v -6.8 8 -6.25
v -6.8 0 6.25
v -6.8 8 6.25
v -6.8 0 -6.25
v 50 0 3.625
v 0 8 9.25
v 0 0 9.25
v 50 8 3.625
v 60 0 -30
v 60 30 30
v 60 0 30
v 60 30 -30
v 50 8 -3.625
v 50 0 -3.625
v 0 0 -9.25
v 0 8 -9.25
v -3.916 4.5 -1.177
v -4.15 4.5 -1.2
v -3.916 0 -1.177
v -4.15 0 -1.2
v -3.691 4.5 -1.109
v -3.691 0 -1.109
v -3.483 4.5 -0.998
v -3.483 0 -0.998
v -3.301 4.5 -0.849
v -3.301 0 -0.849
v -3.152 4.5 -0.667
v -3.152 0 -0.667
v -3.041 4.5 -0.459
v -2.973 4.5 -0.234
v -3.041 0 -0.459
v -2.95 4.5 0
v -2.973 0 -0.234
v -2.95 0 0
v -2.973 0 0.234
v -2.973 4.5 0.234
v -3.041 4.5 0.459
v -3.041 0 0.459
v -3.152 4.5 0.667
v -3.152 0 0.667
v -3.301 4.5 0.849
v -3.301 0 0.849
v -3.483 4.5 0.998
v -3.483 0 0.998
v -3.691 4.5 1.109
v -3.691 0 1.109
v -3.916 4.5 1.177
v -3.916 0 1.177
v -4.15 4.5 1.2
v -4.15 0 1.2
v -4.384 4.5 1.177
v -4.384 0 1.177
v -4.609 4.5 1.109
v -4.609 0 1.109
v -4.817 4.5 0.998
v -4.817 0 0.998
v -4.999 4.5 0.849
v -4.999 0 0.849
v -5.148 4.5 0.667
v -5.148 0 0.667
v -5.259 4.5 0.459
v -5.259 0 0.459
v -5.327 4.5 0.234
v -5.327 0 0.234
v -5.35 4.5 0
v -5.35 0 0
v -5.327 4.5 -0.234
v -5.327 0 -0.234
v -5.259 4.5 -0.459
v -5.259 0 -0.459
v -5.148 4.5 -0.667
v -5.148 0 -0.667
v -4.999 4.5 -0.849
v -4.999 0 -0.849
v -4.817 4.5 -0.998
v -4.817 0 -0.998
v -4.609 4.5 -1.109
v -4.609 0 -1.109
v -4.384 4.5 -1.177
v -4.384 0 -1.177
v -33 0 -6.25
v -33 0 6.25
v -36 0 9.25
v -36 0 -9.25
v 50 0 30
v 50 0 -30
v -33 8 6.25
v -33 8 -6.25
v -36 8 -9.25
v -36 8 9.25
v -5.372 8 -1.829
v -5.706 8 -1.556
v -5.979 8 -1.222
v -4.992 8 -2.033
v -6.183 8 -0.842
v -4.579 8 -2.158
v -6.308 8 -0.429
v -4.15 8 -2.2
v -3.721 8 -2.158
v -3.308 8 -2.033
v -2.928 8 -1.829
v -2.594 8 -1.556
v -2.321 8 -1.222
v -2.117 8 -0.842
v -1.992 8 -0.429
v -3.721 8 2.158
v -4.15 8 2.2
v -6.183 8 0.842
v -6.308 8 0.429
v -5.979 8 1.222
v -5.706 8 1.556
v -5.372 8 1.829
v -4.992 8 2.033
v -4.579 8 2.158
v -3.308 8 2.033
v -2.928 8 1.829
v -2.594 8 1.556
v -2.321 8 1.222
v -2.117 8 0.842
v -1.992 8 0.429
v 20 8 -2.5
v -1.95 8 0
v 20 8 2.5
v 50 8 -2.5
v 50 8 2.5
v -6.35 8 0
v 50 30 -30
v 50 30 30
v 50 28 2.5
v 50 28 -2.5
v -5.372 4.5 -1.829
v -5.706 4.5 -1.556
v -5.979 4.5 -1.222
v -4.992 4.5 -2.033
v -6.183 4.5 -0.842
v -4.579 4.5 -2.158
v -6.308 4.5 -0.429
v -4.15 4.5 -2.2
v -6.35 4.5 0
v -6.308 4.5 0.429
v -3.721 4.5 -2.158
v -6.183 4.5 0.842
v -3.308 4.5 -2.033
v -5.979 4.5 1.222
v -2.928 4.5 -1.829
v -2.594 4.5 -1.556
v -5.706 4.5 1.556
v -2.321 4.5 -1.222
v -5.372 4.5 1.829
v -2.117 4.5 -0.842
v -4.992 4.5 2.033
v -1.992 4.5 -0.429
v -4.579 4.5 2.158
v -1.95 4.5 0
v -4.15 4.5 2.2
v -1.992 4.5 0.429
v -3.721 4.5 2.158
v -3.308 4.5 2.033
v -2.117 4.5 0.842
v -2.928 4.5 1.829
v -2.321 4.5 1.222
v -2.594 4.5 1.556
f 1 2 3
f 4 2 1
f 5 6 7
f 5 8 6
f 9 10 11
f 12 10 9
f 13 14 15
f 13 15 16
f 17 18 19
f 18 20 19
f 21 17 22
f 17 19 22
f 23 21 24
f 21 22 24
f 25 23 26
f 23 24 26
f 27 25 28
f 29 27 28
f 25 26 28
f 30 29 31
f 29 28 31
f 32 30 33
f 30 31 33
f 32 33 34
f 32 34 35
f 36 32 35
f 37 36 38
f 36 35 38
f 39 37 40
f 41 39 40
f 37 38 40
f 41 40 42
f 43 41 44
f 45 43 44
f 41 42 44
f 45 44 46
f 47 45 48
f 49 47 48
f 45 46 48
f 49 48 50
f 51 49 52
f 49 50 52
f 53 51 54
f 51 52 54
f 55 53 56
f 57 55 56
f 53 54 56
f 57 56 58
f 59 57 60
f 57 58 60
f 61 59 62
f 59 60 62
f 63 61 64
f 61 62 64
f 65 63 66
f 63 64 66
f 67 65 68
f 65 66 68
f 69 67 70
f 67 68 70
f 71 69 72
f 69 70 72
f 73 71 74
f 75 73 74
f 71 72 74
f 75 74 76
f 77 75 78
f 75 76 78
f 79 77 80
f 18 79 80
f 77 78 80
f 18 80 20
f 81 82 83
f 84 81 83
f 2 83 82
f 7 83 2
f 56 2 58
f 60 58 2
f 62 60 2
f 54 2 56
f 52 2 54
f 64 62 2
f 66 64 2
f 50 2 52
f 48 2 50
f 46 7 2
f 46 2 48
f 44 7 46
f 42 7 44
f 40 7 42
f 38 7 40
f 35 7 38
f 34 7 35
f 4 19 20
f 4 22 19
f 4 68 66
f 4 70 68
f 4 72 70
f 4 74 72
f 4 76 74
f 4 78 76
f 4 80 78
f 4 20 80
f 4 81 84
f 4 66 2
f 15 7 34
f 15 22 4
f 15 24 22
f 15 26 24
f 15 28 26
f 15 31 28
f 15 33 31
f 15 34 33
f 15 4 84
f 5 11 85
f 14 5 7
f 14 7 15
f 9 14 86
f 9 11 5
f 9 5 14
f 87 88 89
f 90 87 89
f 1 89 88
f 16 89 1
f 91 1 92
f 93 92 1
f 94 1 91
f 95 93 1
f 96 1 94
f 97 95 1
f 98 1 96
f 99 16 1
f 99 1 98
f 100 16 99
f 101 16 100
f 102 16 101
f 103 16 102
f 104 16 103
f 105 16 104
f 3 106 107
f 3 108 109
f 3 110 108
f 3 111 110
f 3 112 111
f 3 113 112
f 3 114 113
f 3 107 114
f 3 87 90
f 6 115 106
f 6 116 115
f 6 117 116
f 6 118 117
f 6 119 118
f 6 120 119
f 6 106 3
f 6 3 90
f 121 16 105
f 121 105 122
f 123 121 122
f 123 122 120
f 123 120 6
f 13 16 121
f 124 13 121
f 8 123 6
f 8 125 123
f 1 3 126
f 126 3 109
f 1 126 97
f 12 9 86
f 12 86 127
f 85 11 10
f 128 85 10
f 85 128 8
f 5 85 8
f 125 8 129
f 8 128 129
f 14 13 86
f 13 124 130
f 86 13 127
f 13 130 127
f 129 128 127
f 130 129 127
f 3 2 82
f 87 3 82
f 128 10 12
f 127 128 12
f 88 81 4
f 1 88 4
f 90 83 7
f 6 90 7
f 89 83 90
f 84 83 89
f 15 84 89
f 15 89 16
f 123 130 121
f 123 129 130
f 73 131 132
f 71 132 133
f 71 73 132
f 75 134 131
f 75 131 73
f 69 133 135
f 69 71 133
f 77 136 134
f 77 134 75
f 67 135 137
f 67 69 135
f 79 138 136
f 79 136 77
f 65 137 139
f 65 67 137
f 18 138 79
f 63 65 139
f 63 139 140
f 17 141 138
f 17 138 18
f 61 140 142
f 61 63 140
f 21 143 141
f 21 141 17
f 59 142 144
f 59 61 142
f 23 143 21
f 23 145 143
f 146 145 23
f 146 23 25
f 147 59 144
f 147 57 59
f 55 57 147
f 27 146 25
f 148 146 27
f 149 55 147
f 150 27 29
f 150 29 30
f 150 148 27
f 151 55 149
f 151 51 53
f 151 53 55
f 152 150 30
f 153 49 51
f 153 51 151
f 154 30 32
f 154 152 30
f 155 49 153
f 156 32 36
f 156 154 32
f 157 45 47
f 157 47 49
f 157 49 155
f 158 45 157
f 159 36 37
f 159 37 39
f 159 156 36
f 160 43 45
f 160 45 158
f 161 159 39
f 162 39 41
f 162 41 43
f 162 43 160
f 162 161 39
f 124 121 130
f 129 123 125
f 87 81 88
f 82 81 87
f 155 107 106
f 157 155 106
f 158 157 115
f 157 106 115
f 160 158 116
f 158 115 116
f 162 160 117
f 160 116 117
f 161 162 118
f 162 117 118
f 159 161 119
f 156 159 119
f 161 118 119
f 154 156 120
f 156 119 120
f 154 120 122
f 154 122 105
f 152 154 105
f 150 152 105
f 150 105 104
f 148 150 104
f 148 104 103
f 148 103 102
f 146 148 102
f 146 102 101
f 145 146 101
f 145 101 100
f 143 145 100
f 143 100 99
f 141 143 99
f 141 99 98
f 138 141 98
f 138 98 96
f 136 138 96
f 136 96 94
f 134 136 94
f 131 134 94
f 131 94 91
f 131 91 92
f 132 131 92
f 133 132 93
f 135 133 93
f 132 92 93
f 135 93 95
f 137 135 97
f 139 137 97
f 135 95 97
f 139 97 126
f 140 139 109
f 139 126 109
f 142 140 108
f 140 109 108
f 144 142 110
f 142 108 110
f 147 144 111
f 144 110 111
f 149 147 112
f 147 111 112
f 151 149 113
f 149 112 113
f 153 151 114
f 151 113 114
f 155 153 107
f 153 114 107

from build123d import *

# Parameters (mm, degrees)
SKETCH_1_W                   = 36
SKETCH_1_H                   = 18.5
EXTRUDE_1_DEPTH              = 8
HOLE_WIZARD_M2_1_D           = 2.4
HOLE_WIZARD_M2_1_CBORE_D     = 4.4
HOLE_WIZARD_M2_1_CBORE_DEPTH = 3.5
SKETCH_8_W                   = 60
SKETCH_8_H                   = 30
EXTRUDE_2_DEPTH              = 10
EXTRUDE_3_DEPTH              = 2.5


with BuildPart() as part:
    # 草图1 → 凸台-拉伸1 (new body)
    with BuildSketch(Plane(origin=(0, 0, 0), x_dir=(1, 0, 0), z_dir=(0, 1, 0))):
        with Locations((-18, 0)):
            Rectangle(SKETCH_1_W, SKETCH_1_H)
        Polygon((-6.8, 6.25), (-29.2, 6.25), (-33, 6.25), (-33, -6.25), (-29.2, -6.25), (-6.8, -6.25), align=None, mode=Mode.SUBTRACT)
    extrude(amount=EXTRUDE_1_DEPTH)

    # M2 凹头盖螺钉的柱形沉头孔1 (through all)
    with Locations(Plane(origin=(-4.15, 8, 0), x_dir=(0, 0, 1), z_dir=(0, 1, 0))):
        with Locations((0, 0)):
            CounterBoreHole(HOLE_WIZARD_M2_1_D / 2, HOLE_WIZARD_M2_1_CBORE_D / 2, HOLE_WIZARD_M2_1_CBORE_DEPTH)

    # 草图4 → 放样1 section 0
    with BuildSketch(Plane(origin=(0, 0, 0), x_dir=(0, 0, -1), z_dir=(1, 0, 0))):
        with BuildLine():
            Line((9.25, 8), (-9.25, 8))
            Line((-9.25, 8), (-9.25, 0))
            Line((-9.25, 0), (9.25, 0))
            Line((9.25, 0), (9.25, 8))
        make_face()
    # 草图5 → 放样1 section 1
    with BuildSketch(Plane(origin=(60, 0, 0), x_dir=(0, 0, -1), z_dir=(1, 0, 0))):
        with BuildLine():
            Line((-2.5, 8), (2.5, 8))
            Line((2.5, 8), (2.5, 0))
            Line((2.5, 0), (-2.5, 0))
            Line((-2.5, 0), (-2.5, 8))
        make_face()
    loft()

    # 草图8 → 凸台-拉伸2 (add)
    with BuildSketch(Plane(origin=(60, 0, 0), x_dir=(0, 0, -1), z_dir=(1, 0, 0))):
        with Locations((0, 15)):
            Rectangle(SKETCH_8_W, SKETCH_8_H)
    extrude(amount=-EXTRUDE_2_DEPTH)

    # 草图11 → 凸台-拉伸3 (add, symmetric)
    with BuildSketch(Plane.XY):
        Polygon((50, 28), (20, 8), (50, 8), align=None)
    extrude(amount=EXTRUDE_3_DEPTH, both=True)


solid = part.part
